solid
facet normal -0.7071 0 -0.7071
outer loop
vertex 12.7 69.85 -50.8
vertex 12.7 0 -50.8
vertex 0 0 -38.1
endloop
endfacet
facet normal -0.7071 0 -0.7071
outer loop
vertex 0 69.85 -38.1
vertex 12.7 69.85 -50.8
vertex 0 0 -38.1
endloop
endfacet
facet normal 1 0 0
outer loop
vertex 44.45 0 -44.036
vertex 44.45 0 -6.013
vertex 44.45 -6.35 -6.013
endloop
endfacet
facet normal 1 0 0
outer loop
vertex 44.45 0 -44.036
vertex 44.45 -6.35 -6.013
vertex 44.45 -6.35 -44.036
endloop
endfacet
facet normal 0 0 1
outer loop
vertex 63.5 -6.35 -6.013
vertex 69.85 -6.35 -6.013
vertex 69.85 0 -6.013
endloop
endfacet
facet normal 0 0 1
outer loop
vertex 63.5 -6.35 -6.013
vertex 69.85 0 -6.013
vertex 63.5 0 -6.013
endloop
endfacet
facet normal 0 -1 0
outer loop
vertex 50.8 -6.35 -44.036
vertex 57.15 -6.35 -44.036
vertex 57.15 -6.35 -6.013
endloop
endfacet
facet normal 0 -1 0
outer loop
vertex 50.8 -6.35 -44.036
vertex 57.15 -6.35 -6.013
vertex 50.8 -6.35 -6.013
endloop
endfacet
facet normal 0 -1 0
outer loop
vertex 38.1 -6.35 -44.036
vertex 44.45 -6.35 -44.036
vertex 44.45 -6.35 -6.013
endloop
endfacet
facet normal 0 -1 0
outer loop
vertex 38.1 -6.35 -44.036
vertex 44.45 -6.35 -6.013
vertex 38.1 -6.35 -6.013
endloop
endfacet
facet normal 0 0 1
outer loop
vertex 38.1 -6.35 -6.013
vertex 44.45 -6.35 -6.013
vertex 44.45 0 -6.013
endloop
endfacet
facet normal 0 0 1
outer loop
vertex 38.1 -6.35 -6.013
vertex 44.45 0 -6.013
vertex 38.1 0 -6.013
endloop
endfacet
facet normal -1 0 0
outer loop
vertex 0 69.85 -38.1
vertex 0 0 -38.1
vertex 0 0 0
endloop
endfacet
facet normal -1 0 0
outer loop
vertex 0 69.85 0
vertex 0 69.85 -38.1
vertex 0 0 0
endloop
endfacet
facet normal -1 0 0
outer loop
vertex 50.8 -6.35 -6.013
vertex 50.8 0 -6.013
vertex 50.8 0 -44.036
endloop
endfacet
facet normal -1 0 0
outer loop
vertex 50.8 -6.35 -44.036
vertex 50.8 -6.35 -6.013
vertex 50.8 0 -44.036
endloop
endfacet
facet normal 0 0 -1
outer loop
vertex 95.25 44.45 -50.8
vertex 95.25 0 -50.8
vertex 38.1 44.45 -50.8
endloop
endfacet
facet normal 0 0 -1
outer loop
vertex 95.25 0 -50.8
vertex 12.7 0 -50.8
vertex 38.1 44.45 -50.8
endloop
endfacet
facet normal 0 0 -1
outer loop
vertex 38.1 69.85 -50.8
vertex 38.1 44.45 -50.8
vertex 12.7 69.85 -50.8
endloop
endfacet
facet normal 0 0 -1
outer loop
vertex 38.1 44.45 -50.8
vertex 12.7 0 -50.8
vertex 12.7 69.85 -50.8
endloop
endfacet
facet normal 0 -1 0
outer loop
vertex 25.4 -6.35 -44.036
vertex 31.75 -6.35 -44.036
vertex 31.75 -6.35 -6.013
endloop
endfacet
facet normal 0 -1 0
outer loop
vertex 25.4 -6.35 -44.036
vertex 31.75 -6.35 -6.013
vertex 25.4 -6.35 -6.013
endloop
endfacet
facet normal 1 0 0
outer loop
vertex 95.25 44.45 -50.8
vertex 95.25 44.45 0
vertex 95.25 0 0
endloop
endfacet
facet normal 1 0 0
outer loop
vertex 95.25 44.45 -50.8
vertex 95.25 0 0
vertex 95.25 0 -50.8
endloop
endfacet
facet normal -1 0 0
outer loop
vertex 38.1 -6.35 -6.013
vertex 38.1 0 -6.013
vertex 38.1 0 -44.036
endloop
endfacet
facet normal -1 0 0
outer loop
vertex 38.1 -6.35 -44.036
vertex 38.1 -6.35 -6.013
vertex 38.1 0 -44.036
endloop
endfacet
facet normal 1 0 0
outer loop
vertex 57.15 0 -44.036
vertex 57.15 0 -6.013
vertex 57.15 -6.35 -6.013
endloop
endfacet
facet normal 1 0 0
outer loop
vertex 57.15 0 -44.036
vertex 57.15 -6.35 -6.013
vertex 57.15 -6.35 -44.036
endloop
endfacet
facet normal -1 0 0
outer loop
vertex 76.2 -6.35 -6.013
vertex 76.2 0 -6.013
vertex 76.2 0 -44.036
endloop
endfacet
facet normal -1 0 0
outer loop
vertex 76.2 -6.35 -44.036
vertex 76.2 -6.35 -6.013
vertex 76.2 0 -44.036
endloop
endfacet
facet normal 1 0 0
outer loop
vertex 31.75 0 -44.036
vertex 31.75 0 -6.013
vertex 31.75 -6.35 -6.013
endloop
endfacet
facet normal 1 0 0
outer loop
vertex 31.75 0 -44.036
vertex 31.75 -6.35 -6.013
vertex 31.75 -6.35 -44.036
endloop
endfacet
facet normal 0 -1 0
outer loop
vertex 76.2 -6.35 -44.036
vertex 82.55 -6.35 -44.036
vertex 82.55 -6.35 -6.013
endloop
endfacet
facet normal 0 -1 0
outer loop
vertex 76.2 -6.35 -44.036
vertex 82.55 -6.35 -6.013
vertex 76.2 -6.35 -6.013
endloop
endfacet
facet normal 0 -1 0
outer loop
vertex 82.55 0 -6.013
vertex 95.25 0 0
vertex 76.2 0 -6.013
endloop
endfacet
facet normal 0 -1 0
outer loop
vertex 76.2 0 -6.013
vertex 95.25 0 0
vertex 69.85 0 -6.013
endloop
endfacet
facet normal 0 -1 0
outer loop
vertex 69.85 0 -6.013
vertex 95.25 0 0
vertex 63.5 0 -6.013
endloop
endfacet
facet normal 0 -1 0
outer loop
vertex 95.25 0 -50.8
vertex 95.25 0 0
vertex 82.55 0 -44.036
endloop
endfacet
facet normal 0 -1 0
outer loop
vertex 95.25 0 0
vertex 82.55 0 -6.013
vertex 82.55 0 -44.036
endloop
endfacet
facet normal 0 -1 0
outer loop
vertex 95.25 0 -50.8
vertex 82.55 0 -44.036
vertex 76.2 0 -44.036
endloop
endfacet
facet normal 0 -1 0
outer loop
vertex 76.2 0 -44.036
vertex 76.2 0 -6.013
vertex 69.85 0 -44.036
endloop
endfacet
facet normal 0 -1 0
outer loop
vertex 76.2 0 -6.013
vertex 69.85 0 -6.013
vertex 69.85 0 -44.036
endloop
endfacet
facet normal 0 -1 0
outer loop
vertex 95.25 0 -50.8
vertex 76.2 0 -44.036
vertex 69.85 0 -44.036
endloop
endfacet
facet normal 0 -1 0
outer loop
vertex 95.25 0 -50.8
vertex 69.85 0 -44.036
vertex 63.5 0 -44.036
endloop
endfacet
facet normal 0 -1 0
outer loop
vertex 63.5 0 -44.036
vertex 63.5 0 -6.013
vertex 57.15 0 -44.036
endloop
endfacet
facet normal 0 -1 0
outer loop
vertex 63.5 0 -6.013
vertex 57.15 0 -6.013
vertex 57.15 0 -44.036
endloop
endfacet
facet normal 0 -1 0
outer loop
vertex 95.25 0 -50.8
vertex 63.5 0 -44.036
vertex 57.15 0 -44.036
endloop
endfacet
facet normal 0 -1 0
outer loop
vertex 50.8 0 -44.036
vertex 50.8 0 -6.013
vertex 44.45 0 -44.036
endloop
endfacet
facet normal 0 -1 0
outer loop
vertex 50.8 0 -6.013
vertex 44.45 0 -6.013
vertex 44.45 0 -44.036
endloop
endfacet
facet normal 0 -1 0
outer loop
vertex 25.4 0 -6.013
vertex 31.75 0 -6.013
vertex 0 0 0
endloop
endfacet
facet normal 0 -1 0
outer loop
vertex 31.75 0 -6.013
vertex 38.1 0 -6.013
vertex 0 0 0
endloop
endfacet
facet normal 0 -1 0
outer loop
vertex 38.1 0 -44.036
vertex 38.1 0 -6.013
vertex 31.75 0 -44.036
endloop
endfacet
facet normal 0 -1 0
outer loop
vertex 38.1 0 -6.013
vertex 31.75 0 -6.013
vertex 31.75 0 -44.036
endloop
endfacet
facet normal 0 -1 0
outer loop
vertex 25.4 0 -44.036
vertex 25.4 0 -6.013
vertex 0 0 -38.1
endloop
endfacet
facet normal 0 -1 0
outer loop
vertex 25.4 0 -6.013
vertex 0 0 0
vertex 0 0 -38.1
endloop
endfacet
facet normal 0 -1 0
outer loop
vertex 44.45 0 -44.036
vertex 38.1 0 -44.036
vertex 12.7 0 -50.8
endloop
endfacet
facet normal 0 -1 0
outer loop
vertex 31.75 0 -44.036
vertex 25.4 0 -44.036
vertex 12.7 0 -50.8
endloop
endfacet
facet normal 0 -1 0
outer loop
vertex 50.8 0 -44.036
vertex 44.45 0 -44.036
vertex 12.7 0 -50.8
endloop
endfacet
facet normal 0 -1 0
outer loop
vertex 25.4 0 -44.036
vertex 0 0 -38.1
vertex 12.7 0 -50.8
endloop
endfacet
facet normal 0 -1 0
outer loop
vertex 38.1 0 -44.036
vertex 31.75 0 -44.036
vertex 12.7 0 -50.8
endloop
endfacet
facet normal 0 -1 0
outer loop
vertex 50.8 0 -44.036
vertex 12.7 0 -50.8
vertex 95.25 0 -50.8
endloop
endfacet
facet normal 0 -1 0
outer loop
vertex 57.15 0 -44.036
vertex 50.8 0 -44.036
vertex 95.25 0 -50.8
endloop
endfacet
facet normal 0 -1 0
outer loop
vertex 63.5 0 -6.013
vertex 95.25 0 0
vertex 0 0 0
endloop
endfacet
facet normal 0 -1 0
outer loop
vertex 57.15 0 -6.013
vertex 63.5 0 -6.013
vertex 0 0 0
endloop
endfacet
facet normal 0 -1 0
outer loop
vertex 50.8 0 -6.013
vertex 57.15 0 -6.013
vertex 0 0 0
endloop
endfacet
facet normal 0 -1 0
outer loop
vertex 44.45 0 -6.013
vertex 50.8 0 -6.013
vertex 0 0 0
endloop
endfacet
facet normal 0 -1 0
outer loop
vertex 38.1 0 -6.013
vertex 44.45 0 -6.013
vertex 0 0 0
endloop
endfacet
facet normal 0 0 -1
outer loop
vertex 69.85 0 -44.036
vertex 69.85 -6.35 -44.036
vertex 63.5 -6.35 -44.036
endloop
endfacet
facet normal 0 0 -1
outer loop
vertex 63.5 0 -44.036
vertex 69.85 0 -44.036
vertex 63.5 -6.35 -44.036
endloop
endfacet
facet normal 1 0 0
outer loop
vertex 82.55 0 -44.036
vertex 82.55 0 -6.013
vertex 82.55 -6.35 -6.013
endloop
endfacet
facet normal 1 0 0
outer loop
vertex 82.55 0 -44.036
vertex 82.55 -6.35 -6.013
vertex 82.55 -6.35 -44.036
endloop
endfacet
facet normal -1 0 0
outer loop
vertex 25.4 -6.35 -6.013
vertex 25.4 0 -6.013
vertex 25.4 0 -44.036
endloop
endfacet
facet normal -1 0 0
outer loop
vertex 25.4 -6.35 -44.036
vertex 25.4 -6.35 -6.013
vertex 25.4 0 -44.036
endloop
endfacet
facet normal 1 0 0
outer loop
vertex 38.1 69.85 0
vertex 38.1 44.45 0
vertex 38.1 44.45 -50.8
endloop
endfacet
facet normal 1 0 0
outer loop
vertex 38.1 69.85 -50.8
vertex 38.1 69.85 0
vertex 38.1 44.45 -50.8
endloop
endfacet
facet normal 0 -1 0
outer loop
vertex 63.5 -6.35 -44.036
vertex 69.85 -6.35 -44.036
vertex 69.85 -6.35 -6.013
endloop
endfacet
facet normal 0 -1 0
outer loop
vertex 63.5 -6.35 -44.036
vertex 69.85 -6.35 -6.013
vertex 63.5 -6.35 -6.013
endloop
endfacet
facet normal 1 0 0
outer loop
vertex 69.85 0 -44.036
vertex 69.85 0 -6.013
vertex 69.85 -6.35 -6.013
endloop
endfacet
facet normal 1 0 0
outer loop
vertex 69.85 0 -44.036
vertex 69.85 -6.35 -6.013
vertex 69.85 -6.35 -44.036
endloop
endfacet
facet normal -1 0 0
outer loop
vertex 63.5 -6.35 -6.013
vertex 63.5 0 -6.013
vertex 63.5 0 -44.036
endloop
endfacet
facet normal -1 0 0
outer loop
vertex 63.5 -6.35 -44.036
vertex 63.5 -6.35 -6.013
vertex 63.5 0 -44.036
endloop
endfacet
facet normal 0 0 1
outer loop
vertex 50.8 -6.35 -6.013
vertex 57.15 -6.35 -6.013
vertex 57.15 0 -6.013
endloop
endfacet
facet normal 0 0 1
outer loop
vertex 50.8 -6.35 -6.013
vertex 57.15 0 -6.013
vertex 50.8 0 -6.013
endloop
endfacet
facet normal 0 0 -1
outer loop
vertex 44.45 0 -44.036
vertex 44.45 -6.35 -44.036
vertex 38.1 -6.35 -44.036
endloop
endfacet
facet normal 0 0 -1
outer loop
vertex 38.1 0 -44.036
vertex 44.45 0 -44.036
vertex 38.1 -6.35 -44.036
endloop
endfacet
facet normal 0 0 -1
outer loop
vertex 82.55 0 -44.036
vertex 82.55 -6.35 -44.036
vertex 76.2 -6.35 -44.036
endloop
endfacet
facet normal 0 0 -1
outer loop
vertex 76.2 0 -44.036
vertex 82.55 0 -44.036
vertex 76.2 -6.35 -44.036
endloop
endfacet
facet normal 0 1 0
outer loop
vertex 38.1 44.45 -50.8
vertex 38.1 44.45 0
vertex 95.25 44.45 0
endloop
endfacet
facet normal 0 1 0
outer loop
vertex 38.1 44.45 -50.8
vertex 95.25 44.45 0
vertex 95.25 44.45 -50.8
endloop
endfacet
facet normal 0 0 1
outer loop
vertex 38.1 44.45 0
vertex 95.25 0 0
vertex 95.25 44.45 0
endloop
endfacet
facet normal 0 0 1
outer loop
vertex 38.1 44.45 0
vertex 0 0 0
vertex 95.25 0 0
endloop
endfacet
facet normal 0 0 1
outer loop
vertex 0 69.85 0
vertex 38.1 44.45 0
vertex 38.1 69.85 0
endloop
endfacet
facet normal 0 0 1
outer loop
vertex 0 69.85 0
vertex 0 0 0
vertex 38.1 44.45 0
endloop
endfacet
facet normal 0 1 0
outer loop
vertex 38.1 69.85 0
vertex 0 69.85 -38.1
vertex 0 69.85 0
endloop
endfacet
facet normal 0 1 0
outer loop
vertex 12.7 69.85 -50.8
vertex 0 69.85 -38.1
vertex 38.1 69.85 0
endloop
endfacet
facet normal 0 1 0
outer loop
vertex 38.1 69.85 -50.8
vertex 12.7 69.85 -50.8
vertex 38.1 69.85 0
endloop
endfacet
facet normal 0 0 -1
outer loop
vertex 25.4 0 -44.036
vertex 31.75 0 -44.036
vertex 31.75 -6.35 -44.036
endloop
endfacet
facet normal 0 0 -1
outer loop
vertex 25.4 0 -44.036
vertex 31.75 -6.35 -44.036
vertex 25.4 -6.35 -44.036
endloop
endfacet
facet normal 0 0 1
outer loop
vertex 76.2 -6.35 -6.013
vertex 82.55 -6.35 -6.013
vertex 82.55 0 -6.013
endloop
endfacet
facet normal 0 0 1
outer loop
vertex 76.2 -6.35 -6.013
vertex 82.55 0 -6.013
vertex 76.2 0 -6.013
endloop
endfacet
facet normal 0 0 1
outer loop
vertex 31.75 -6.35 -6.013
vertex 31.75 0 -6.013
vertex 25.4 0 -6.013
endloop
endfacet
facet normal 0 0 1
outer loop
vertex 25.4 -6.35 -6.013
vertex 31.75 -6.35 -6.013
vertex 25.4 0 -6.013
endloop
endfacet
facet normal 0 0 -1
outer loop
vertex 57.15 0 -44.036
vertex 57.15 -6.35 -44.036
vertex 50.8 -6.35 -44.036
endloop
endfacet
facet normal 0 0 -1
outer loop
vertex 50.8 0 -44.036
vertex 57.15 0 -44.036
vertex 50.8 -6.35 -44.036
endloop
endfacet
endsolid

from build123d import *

# Parameters (mm, degrees)
BOSS_EXTRUDE1_DEPTH = 69.85
SKETCH2_W           = 50.8
SKETCH2_H           = 44.45
BOSS_EXTRUDE2_DEPTH = 57.15
SKETCH3_W           = 6.35
SKETCH3_H           = 38.023239414
BOSS_EXTRUDE3_DEPTH = 6.35


with BuildPart() as part:
    # Sketch1 → Boss-Extrude1 (new body)
    with BuildSketch(Plane(origin=(0, 0, 0), x_dir=(1, 0, 0), z_dir=(0, 1, 0))):
        Polygon((0, 0), (38.1, 0), (38.1, 50.8), (12.7, 50.8), (0, 38.1), align=None)
    extrude(amount=BOSS_EXTRUDE1_DEPTH)

    # Sketch2 → Boss-Extrude2 (add)
    with BuildSketch(Plane(origin=(38.1, 0, 0), x_dir=(0, 0, -1), z_dir=(1, 0, 0))):
        with Locations((25.4, 22.225)):
            Rectangle(SKETCH2_W, SKETCH2_H)
    extrude(amount=BOSS_EXTRUDE2_DEPTH)

    # Sketch3 → Boss-Extrude3 (add)
    with BuildSketch(Plane(origin=(0, 0, 0), x_dir=(-1, 0, 0), z_dir=(0, -1, 0))):
        with Locations((-28.575, 25.024461833)):
            Rectangle(SKETCH3_W, SKETCH3_H)
        with Locations((-41.275, 25.024461833)):
            Rectangle(SKETCH3_W, SKETCH3_H)
        with Locations((-53.975, 25.024461833)):
            Rectangle(SKETCH3_W, SKETCH3_H)
        with Locations((-66.675, 25.024461833)):
            Rectangle(SKETCH3_W, SKETCH3_H)
        with Locations((-79.375, 25.024461833)):
            Rectangle(SKETCH3_W, SKETCH3_H)
    extrude(amount=BOSS_EXTRUDE3_DEPTH)


solid = part.part
